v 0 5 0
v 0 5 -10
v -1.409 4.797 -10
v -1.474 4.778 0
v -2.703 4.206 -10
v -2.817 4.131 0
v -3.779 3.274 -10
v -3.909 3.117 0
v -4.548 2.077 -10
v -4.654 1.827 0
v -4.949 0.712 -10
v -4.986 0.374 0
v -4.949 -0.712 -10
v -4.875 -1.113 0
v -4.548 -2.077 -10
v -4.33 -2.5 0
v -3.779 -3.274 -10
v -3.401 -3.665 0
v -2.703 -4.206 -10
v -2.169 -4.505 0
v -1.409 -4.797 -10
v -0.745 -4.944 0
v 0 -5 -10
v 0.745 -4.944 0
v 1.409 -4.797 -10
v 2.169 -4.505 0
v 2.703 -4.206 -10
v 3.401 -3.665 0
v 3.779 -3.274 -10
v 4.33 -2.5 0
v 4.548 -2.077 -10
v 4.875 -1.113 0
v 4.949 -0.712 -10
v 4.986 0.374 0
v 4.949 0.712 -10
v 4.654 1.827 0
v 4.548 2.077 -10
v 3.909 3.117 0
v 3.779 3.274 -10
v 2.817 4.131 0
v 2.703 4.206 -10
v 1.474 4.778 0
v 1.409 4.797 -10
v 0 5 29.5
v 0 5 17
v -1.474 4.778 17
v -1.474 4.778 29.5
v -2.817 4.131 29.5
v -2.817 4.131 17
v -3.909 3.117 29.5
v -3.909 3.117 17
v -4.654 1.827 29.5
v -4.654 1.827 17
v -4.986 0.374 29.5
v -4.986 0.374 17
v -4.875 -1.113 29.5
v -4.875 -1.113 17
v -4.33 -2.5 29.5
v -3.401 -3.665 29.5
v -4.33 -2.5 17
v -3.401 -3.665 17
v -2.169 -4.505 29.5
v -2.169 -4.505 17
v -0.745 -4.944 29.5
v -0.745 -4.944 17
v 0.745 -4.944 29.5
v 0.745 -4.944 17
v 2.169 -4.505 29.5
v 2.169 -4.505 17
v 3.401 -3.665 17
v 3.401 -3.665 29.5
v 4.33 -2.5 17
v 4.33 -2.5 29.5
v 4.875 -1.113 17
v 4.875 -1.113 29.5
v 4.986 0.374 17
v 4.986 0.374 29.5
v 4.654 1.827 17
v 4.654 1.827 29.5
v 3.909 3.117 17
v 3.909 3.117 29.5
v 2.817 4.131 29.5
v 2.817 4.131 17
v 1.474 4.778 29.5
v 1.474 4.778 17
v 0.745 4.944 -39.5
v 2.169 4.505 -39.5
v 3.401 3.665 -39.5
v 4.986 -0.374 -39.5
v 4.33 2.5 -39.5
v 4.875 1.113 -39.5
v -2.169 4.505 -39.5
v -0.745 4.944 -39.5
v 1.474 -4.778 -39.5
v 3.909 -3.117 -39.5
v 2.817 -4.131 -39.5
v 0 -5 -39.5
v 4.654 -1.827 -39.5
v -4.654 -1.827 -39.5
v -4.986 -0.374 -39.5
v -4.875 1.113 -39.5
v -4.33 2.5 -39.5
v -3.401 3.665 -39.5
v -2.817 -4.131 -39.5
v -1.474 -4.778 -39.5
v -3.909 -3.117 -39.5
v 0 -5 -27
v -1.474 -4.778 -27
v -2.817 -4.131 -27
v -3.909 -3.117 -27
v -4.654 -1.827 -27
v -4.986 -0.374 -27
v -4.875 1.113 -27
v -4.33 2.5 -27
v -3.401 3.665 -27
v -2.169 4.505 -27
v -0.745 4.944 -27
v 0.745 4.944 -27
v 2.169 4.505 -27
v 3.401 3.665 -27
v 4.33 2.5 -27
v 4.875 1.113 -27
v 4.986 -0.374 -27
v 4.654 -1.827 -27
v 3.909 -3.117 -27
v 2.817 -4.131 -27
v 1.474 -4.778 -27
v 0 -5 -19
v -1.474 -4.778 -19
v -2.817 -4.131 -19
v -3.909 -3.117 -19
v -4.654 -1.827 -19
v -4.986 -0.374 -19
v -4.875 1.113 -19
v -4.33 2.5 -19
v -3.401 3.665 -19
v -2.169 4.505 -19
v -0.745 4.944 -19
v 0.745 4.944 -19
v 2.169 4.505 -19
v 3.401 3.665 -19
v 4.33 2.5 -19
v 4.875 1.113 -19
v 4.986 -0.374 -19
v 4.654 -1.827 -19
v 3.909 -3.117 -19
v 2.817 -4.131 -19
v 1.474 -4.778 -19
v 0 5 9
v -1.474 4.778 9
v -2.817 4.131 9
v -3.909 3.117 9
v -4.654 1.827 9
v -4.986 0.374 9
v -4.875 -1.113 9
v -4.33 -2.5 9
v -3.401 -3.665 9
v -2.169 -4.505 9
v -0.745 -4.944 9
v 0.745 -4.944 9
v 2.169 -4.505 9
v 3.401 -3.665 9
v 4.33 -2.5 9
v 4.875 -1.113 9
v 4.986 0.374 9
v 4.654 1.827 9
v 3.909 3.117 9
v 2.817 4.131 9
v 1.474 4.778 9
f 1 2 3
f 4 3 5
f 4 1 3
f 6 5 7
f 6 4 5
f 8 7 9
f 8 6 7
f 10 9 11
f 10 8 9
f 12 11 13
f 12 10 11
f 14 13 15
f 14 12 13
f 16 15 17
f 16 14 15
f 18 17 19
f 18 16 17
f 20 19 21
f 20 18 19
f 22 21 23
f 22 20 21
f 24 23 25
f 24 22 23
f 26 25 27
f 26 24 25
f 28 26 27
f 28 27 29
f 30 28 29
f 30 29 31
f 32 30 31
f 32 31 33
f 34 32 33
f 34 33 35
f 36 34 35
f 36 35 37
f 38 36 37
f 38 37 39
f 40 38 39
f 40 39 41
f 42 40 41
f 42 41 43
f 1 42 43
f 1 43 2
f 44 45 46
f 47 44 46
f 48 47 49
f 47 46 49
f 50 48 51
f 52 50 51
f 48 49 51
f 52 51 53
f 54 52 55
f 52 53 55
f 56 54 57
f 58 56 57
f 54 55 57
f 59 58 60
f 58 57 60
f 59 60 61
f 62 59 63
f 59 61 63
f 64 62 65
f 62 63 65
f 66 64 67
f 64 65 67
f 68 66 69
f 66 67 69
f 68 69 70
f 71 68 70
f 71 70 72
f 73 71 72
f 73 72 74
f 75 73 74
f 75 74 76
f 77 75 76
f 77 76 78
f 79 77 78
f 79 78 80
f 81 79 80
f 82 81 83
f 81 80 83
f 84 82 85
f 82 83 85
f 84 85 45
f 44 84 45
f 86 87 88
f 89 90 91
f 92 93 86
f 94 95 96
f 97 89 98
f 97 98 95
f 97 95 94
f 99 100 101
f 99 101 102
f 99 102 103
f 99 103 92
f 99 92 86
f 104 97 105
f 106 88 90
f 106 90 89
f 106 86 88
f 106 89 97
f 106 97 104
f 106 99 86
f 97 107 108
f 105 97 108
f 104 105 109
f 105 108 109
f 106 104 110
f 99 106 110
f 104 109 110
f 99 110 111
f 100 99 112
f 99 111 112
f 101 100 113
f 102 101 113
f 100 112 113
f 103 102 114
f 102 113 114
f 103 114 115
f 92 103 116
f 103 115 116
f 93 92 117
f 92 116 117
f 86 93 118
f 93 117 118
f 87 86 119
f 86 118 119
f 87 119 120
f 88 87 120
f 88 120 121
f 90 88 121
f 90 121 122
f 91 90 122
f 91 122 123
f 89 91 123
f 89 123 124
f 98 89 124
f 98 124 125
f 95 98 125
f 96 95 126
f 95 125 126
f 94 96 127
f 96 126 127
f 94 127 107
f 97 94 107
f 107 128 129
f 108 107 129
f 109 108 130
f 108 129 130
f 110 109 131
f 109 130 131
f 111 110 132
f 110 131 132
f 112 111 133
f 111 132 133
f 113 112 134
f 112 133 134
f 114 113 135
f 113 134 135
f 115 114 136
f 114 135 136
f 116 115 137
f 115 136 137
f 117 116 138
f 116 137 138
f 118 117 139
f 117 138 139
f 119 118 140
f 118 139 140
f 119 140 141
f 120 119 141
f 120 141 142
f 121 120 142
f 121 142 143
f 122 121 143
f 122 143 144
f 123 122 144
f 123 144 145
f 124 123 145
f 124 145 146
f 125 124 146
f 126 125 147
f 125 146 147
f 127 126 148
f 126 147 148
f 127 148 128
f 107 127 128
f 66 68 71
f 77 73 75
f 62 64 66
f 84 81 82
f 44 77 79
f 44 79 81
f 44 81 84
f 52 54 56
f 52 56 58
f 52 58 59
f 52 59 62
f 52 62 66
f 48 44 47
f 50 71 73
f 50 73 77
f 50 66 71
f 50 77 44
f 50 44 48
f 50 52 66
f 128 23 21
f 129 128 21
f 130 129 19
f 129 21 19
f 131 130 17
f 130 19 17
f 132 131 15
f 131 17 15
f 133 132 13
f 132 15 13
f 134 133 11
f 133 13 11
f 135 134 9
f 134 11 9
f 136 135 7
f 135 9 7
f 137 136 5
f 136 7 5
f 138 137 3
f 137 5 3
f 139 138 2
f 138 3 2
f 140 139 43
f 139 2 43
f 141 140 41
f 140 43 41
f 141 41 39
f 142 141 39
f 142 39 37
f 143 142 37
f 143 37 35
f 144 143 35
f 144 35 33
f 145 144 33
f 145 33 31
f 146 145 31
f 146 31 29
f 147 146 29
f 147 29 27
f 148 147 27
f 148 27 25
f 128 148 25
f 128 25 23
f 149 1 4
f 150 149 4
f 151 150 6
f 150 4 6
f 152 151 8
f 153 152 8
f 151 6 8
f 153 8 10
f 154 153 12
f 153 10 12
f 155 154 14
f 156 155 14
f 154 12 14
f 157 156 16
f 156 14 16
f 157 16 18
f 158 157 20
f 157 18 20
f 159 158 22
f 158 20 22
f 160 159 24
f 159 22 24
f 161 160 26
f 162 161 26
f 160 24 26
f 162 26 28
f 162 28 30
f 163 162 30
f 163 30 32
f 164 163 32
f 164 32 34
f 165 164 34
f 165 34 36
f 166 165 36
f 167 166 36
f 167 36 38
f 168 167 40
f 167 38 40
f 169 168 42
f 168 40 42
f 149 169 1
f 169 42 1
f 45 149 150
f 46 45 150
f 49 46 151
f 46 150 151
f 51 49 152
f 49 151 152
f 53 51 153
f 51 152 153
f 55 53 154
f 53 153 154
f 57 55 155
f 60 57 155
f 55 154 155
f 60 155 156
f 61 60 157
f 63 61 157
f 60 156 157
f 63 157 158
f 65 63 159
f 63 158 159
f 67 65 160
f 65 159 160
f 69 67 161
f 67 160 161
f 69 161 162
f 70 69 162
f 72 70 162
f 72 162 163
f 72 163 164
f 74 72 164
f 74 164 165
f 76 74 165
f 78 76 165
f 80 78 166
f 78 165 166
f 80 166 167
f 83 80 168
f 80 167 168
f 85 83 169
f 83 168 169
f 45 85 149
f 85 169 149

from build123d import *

# Parameters (mm, degrees)
PAD_DEPTH    = 10
PAD001_DEPTH = 9
PAD002_DEPTH = 9
PAD003_DEPTH = 8
PAD004_DEPTH = 8
PAD005_DEPTH = 12.5
PAD006_DEPTH = 12.5


with BuildPart() as part:
    # Sketch → Pad (new body)
    with BuildSketch(Plane.XY):
        with BuildLine():
            ThreePointArc((0, -5), (5, 0), (0, 5))
            ThreePointArc((0, 5), (-5, 0), (0, -5))
        make_face()
    extrude(amount=-PAD_DEPTH)

    # Pad Face3 → Pad001 (add)
    with BuildSketch(Plane(origin=(0, 0, 0), x_dir=(0, 1, 0), z_dir=(0, 0, 1))):
        with BuildLine():
            ThreePointArc((-5, 0), (0, -5), (5, 0))
            ThreePointArc((5, 0), (0, 5), (-5, 0))
        make_face()
    extrude(amount=PAD001_DEPTH)

    # Pad001 Face4 → Pad002 (add)
    with BuildSketch(Plane(origin=(0, 0, -10), x_dir=(0, -1, 0), z_dir=(0, 0, -1))):
        with BuildLine():
            ThreePointArc((-5, 0), (0, -5), (5, 0))
            ThreePointArc((5, 0), (0, 5), (-5, 0))
        make_face()
    extrude(amount=PAD002_DEPTH)

    # Pad002 Face7 → Pad003 (add)
    with BuildSketch(Plane(origin=(0, 0, 9), x_dir=(0, 1, 0), z_dir=(0, 0, 1))):
        with BuildLine():
            ThreePointArc((-5, 0), (0, -5), (5, 0))
            ThreePointArc((5, 0), (0, 5), (-5, 0))
        make_face()
    extrude(amount=PAD003_DEPTH)

    # Pad003 Face8 → Pad004 (add)
    with BuildSketch(Plane(origin=(0, 0, -19), x_dir=(0, -1, 0), z_dir=(0, 0, -1))):
        with BuildLine():
            ThreePointArc((-5, 0), (0, -5), (5, 0))
            ThreePointArc((5, 0), (0, 5), (-5, 0))
        make_face()
    extrude(amount=PAD004_DEPTH)

    # Pad004 Face11 → Pad005 (add)
    with BuildSketch(Plane(origin=(0, 0, 17), x_dir=(0, 1, 0), z_dir=(0, 0, 1))):
        with BuildLine():
            ThreePointArc((-5, 0), (0, -5), (5, 0))
            ThreePointArc((5, 0), (0, 5), (-5, 0))
        make_face()
    extrude(amount=PAD005_DEPTH)

    # Pad005 Face12 → Pad006 (add)
    with BuildSketch(Plane(origin=(0, 0, -27), x_dir=(0, -1, 0), z_dir=(0, 0, -1))):
        with BuildLine():
            ThreePointArc((-5, 0), (0, -5), (5, 0))
            ThreePointArc((5, 0), (0, 5), (-5, 0))
        make_face()
    extrude(amount=PAD006_DEPTH)


solid = part.part
